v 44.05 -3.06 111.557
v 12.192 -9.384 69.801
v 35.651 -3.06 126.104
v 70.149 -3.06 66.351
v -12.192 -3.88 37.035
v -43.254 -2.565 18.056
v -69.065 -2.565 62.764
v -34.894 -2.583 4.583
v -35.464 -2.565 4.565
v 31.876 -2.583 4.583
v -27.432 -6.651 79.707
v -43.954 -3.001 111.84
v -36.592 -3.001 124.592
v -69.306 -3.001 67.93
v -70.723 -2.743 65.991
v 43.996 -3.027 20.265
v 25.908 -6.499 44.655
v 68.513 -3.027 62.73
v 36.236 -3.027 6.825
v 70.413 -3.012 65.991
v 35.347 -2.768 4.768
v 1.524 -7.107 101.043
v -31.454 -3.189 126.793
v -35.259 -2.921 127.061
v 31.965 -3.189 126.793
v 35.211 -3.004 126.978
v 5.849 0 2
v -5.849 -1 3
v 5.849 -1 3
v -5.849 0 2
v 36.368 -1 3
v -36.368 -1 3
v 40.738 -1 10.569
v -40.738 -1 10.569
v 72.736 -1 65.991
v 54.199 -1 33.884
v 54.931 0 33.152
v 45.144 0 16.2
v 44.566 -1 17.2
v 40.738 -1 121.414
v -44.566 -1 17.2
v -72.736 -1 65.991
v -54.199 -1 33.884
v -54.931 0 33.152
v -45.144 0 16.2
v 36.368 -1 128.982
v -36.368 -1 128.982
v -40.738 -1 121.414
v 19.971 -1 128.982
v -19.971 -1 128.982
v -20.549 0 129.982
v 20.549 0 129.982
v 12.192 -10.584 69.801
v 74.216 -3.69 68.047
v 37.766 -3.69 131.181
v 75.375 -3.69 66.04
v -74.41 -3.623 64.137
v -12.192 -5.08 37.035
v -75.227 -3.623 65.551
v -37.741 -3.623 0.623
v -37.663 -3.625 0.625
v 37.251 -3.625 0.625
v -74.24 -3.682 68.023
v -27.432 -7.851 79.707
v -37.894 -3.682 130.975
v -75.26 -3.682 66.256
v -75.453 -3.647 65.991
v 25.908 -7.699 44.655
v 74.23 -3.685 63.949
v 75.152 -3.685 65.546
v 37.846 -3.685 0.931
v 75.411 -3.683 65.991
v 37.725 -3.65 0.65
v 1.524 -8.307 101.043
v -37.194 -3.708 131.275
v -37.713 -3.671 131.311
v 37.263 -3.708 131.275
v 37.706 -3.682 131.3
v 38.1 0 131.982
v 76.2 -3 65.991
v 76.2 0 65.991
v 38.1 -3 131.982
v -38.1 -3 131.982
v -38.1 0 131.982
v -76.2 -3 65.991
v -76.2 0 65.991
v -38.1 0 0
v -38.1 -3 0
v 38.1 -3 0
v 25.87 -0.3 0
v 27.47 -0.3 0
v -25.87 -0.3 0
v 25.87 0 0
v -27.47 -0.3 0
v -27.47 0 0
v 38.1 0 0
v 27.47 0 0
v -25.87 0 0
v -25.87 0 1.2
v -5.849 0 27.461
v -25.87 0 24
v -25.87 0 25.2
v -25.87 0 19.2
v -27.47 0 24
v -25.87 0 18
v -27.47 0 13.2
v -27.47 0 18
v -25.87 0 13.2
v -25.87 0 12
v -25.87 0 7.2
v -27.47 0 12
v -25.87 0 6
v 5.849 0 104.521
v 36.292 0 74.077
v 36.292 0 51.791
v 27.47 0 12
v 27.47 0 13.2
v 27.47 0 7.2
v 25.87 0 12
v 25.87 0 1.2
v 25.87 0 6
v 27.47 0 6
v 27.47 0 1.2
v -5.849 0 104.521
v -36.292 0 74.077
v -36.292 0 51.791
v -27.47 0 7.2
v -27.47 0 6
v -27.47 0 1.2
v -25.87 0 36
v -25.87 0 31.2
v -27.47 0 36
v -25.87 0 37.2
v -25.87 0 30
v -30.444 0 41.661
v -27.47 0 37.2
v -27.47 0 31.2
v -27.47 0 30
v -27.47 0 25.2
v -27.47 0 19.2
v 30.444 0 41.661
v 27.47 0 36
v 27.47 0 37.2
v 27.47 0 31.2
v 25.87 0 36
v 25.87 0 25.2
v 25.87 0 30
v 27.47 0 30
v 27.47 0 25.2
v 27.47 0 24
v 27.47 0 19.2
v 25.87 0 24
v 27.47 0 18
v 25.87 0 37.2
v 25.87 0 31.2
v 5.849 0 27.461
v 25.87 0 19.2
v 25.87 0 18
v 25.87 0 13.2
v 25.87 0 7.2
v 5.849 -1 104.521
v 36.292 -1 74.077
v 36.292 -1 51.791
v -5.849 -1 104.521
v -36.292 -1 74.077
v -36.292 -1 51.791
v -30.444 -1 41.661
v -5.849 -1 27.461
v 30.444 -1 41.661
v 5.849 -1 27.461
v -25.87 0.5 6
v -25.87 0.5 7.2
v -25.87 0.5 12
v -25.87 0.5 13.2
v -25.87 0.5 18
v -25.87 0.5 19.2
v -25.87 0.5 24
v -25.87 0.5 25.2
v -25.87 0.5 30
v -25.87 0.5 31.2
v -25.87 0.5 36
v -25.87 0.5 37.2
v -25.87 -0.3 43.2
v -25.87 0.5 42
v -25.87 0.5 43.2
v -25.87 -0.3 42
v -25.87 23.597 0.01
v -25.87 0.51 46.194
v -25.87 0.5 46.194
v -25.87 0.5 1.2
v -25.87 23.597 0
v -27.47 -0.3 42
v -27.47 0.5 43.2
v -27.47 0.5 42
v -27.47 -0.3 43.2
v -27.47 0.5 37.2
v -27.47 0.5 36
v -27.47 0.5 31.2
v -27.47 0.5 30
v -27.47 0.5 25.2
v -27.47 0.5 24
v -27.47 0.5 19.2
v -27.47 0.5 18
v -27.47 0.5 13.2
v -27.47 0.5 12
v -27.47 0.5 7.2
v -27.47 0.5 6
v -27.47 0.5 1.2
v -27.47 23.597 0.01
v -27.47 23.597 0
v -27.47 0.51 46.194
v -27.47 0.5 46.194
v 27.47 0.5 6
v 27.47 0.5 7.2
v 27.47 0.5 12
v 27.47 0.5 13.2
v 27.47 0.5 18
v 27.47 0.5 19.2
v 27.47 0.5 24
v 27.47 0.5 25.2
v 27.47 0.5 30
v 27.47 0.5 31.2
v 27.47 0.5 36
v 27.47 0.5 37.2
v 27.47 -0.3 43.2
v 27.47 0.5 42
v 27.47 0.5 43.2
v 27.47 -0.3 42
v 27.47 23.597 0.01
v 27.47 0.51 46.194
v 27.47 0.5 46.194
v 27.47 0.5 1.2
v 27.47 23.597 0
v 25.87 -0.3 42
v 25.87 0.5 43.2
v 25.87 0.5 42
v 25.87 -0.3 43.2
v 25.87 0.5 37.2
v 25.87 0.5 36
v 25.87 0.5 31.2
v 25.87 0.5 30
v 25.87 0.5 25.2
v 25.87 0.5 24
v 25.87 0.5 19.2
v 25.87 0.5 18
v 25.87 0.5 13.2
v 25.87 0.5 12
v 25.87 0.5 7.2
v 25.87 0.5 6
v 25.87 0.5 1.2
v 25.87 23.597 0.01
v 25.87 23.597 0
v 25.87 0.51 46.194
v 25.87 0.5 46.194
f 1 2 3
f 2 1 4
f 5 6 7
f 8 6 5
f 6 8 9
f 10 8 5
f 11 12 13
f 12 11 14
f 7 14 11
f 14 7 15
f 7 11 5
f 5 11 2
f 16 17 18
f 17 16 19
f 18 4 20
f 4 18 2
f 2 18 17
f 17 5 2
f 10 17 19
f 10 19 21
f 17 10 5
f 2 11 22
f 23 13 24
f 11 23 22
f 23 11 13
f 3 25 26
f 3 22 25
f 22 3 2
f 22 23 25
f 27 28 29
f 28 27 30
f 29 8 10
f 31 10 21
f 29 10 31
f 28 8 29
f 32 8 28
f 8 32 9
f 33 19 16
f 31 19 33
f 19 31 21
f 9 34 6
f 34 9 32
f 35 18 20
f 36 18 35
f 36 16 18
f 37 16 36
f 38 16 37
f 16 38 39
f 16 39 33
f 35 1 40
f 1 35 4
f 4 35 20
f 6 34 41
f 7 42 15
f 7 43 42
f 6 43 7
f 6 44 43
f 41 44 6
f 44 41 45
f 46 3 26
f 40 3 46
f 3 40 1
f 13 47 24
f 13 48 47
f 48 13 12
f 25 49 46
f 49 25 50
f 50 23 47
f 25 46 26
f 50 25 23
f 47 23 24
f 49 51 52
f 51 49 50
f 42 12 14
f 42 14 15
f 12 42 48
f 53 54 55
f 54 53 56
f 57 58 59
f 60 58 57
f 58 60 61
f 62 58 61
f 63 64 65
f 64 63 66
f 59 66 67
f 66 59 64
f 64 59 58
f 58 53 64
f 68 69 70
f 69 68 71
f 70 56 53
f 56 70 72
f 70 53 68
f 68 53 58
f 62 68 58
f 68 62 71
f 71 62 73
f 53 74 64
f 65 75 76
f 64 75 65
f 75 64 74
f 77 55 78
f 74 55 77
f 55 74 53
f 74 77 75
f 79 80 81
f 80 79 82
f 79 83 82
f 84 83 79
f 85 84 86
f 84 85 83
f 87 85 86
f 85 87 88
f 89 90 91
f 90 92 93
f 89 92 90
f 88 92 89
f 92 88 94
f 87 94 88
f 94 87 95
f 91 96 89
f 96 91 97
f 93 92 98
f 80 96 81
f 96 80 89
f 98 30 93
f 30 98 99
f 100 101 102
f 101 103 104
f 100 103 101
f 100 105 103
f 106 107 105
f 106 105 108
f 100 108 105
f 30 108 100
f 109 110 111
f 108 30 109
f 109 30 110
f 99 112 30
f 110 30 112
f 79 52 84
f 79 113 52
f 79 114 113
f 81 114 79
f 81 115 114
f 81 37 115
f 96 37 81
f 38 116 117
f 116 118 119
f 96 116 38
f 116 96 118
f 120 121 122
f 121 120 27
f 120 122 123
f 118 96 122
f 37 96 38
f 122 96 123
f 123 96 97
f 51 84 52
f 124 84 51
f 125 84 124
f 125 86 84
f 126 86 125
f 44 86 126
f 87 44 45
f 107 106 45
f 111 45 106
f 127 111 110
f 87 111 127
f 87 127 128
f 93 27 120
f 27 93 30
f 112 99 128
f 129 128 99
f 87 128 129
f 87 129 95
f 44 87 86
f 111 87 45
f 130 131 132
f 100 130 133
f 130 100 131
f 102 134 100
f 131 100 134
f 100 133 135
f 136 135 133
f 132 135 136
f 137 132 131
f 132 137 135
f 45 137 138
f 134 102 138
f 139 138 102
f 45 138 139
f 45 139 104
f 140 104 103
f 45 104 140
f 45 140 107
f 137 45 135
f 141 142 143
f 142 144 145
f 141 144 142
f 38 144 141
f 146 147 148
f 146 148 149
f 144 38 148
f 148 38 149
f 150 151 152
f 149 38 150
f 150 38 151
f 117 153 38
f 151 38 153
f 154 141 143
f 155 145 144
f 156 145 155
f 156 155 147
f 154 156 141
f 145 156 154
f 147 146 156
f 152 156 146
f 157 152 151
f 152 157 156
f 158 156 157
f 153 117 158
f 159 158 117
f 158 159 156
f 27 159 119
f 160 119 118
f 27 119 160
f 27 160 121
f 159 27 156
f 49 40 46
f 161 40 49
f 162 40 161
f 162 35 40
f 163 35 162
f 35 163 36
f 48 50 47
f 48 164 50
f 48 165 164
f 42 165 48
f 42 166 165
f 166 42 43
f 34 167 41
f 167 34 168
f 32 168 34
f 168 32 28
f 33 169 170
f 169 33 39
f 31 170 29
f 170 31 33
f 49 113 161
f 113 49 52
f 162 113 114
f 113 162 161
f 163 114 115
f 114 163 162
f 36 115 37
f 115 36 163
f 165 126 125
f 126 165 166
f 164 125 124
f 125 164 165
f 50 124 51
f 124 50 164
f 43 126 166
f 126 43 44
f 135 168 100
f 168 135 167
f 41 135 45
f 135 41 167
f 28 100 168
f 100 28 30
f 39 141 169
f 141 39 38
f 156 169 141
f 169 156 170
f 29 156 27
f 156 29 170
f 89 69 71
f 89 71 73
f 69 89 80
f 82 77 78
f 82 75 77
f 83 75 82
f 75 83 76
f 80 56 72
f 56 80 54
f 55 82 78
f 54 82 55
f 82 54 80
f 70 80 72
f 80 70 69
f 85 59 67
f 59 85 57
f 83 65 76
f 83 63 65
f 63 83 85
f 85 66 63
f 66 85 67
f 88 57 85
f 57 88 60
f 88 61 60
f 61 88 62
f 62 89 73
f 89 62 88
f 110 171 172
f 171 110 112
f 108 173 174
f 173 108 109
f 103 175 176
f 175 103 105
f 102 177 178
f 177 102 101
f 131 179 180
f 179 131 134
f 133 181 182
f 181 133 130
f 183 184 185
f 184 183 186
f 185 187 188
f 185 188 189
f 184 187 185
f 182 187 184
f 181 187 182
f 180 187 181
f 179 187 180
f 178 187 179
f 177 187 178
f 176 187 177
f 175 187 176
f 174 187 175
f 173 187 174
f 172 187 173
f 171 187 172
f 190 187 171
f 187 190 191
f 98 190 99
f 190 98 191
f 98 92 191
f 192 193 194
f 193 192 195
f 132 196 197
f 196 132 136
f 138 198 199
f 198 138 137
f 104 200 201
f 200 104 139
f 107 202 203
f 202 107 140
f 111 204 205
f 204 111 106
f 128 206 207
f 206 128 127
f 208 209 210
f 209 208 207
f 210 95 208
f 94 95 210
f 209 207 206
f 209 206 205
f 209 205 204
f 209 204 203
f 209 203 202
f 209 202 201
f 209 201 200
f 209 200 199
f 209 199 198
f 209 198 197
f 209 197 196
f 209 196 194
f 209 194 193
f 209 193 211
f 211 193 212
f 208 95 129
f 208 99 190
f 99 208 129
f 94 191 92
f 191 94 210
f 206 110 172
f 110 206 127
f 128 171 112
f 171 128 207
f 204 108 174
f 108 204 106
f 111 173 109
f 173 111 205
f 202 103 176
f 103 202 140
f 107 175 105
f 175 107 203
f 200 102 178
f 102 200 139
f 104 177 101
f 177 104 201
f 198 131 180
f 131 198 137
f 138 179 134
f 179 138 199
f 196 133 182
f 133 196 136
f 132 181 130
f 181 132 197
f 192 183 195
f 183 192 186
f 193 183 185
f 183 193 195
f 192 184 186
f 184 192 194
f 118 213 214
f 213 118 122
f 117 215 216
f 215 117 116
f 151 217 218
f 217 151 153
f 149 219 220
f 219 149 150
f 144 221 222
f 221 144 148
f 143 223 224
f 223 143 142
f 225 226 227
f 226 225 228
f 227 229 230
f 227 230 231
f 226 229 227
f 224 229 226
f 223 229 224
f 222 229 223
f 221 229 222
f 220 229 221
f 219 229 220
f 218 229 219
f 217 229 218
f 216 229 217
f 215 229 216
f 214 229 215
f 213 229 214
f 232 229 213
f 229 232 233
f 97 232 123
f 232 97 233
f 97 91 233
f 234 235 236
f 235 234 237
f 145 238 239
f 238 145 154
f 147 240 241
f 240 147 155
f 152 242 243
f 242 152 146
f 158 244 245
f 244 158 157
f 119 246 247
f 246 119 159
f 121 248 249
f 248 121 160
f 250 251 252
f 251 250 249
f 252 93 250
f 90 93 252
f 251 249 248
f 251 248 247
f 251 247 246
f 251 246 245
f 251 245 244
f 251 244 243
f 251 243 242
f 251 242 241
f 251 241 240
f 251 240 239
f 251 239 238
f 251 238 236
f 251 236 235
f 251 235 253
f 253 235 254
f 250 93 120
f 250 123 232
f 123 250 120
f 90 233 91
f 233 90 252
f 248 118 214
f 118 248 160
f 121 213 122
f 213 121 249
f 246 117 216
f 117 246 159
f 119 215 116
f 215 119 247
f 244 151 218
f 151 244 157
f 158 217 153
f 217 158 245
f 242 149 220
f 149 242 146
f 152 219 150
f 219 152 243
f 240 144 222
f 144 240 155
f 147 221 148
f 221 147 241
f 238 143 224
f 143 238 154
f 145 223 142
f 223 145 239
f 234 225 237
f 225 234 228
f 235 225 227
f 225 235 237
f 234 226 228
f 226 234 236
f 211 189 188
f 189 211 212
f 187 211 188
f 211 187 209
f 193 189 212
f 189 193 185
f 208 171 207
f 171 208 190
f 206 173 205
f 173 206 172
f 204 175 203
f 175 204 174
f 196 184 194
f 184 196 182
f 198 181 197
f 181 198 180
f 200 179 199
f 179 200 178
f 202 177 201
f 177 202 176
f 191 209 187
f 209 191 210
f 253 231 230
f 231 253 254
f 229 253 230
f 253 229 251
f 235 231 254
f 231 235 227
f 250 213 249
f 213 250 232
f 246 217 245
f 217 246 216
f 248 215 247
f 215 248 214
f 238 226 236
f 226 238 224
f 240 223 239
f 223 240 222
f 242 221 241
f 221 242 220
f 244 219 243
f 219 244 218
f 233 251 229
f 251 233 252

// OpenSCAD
// Hexagon wall tile v35 — parametric rebuild of v30
// Front: identical low-poly facets to v30 (same facet angles at every size).
// Edge profile: identical on every size (edge depth, rim width) so tiles butt flush.
// Back: six corner pads for 1" (25 mm) double-sided mounting tape.
// v32: tape pads are flat plates hung from the rim with an air gap to the front skin.
// v33: thinner skin + thinner pads so the air gap is 1.4 mm even right at the edges
//      (v32 had only 0.8 mm there and showed marks along the slanted edges).
// v34: snap-off stabilizer fins behind the bottom edge so the tall, thin tile can't tip over
//      while printing. Break them off afterwards (bend sideways) and the back stays flat.
// v35: 0.6 mm 45° chamfer on the front edge (crisp, consistent shadow line between tiles; hides
//      first-layer squish and brim trim marks) + relief_scale to deepen the facets if wanted.
// Prints upright on a flat edge with NO supports (every downward edge is 45° or steeper).
//
// Export one size at a time, e.g.:
//   openscad -D size_in=6 -o hex_tile_v35_6in.stl hex_wall_tile_v35.scad

/* [Size] */
size_in       = 6;      // point-to-point width in inches (3, 6, 10 ...)

/* [Edge profile — keep identical across sizes] */
// Space behind the skin at the edge = edge_depth - skin; it must be >= pad_plate + pad_gap + pad_recess.
edge_depth    = 3.6;    // depth of the outer edge, back plane to front face (mm)
rim           = 2.0;    // perimeter wall thickness at the back plane (mm)
front_chamfer = 0.6;    // 45° chamfer on the front edge (mm); 0 = sharp edge

/* [Look] */
relief_scale  = 1.0;    // 1.0 = v30 facets; 1.5 = 50% deeper facets (same edge profile on all sizes)

/* [Front skin] */
skin          = 1.2;    // front skin thickness (mm) — 3 lines at 0.4 mm, same on all sizes

/* [Tape pads] */
tape_width    = 25.4;   // tape width (mm)
pad_margin    = 3;      // extra pad width beyond the tape (mm)
pad_max_frac  = 0.45;   // pad never larger than this fraction of the tile radius (keeps 3" usable)
pad_plate     = 1.0;    // thickness of the pad plates (mm)
pad_gap       = 1.4;    // minimum air gap between pads and the front skin (mm) — keeps the front clean
pad_recess    = 0;      // pads set back from the rim (mm); >0 lets the rim touch the wall,
                        // but near the edges the plate is then trimmed thinner to keep pad_gap

/* [Print stabilizers (snap off after printing)] */
stabilizers   = true;
fin_count     = 2;      // fins behind the bottom edge, placed symmetrically
fin_thick     = 1.6;    // fin thickness (mm)
fin_height_frac = 0.35; // fin height as a fraction of the tile height
fin_depth_frac  = 0.5;  // fin depth behind the tile as a fraction of fin height
fin_depth_min   = 15;   // (mm)
fin_gap       = 0.5;    // air gap between fin and tile back (mm)
tab_height    = 1.2;    // breakaway tab height (mm, vertical when printing)
tab_pitch     = 6;      // spacing between tabs (mm)

/* [Output] */
orient_for_print = true; // stand upright on a flat edge, back facing +Y

/* [Hidden] */
R   = size_in * 25.4 / 2;         // corner radius
AP  = R * cos(30);                // apothem
PAD = min(tape_width + pad_margin, R * pad_max_frac);

// Normalised front geometry from v30 (x, y in units of R; z = relief above edge, units of R)
FP = [[1,0,0],[0.5,0.866025,0],[-0.5,0.866025,0],[-1,0,0],[-0.5,-0.866025,0],[0.5,-0.866025,0],
      [0.16,0.05,0.091654],[-0.16,-0.38,0.019428],[-0.36,0.18,0.05579],[0.34,-0.28,0.053795],[0.02,0.46,0.061766]];
FACES = [[0,6,1],[4,3,7],[5,4,7],[8,3,2],[7,3,8],[7,8,6],[5,9,0],[9,6,0],[9,7,6],[5,7,9],
         [6,8,10],[8,2,10],[6,10,1],[10,2,1],
         [1,12,11,0],[2,13,12,1],[3,14,13,2],[4,15,14,3],[5,16,15,4],[0,11,16,5],
         [11,12,13,14,15,16]];
RELIEF_MAX = 0.091654 * R * relief_scale;
D = edge_depth + RELIEF_MAX + 1;  // max depth used for chamfers

// Solid bounded by the faceted front (shifted by dz) and a flat back at z = zb
module body(dz = 0, zb = 0) {
    pts = concat(
        [for (p = FP) [p[0]*R, p[1]*R, edge_depth + p[2]*R*relief_scale + dz]],
        [for (i = [0:5]) [FP[i][0]*R, FP[i][1]*R, zb]]);
    polyhedron(points = pts, faces = FACES, convexity = 4);
}

module hex2d(apothem) { circle(r = apothem / cos(30), $fn = 6); }

// Back cavity: behind the skin, inside the rim; rim inner faces slope 45° so nothing needs support
module cavity(extra = 0) {
    H  = D + 2;
    a0 = AP - rim - extra + 1;             // apothem at z = -1
    intersection() {
        body(dz = -skin - extra, zb = -1);
        translate([0, 0, -1]) linear_extrude(height = H, scale = (a0 - H) / a0) hex2d(a0);
    }
}

// Corner pad footprint (2D), k = corner index 0..5:
// the corner region of the inner hex, PAD wide, long enough to hold a PAD x PAD square of tape
module pad_core(k) {
    U0  = (AP - rim) / cos(30);                    // inner corner distance from centre
    LEN = PAD / (2 * tan(60)) + PAD + 1;           // apex taper + full square + margin
    intersection() {
        hex2d(AP - rim + 0.3);                     // overlap 0.3 mm into the rim to fuse
        rotate(60 * k) translate([U0 - LEN, -PAD / 2]) square([LEN + 5, PAD]);
    }
}

// In-plane self-support: printed upright, a vertical plate needs every downward edge at >= 45°.
// Sweep each pad toward the nearest rim side below it at 45° (or straight down for bottom corners).
SWEEP = [[1, -1], [1, -1], [-1, -1], [-1, -1], [0, -1], [0, -1]];
module pad_fp(k) {
    intersection() {
        hex2d(AP - rim + 0.3);
        hull() { pad_core(k); translate(SWEEP[k] * R) pad_core(k); }
    }
}

module pads() {
    intersection() {
        body(dz = -skin - pad_gap, zb = -1);       // never closer than pad_gap to the skin
        translate([0, 0, pad_recess]) linear_extrude(pad_plate) for (k = [0:5]) pad_fp(k);
    }
}

module chamfer_clip() {
    HB = D + 5;
    union() {
        translate([0, 0, -2]) linear_extrude(edge_depth - front_chamfer + 2) hex2d(AP + 1);
        translate([0, 0, edge_depth - front_chamfer]) linear_extrude(height = HB, scale = (AP - HB) / AP) hex2d(AP);
    }
}

module tile() {
    intersection() {
        union() {
            difference() { body(); cavity(); }
            pads();
        }
        if (front_chamfer > 0) chamfer_clip(); else translate([-2*R, -2*R, -5]) cube([4*R, 4*R, 4*R]);
    }
}

// Triangular fins standing on the bed behind the back (model z < 0), joined to the tile by small tabs
FIN_H = fin_height_frac * 2 * AP;
FIN_L = max(fin_depth_min, fin_depth_frac * FIN_H);
function fin_x(i) = (fin_count == 1) ? 0 : (-1 + 2 * i / (fin_count - 1)) * 0.35 * R;
module stabilizer_fins() {
    for (i = [0 : fin_count - 1]) {
        x = fin_x(i);
        hull() {                                            // fin: vertical triangle
            translate([x - fin_thick/2, -AP, -fin_gap - FIN_L]) cube([fin_thick, 0.01, FIN_L]);
            translate([x - fin_thick/2, -AP, -fin_gap - 0.01]) cube([fin_thick, FIN_H, 0.01]);
        }
        for (y = [0 : tab_pitch : FIN_H - tab_height])      // breakaway tabs into the back plane
            translate([x - fin_thick/2, -AP + y, -fin_gap - 0.05]) cube([fin_thick, tab_height, fin_gap + 0.35]);
    }
}

if (orient_for_print)
    translate([0, 0, AP]) rotate([90, 0, 0]) { tile(); if (stabilizers) stabilizer_fins(); }
else
    { tile(); if (stabilizers) stabilizer_fins(); }
